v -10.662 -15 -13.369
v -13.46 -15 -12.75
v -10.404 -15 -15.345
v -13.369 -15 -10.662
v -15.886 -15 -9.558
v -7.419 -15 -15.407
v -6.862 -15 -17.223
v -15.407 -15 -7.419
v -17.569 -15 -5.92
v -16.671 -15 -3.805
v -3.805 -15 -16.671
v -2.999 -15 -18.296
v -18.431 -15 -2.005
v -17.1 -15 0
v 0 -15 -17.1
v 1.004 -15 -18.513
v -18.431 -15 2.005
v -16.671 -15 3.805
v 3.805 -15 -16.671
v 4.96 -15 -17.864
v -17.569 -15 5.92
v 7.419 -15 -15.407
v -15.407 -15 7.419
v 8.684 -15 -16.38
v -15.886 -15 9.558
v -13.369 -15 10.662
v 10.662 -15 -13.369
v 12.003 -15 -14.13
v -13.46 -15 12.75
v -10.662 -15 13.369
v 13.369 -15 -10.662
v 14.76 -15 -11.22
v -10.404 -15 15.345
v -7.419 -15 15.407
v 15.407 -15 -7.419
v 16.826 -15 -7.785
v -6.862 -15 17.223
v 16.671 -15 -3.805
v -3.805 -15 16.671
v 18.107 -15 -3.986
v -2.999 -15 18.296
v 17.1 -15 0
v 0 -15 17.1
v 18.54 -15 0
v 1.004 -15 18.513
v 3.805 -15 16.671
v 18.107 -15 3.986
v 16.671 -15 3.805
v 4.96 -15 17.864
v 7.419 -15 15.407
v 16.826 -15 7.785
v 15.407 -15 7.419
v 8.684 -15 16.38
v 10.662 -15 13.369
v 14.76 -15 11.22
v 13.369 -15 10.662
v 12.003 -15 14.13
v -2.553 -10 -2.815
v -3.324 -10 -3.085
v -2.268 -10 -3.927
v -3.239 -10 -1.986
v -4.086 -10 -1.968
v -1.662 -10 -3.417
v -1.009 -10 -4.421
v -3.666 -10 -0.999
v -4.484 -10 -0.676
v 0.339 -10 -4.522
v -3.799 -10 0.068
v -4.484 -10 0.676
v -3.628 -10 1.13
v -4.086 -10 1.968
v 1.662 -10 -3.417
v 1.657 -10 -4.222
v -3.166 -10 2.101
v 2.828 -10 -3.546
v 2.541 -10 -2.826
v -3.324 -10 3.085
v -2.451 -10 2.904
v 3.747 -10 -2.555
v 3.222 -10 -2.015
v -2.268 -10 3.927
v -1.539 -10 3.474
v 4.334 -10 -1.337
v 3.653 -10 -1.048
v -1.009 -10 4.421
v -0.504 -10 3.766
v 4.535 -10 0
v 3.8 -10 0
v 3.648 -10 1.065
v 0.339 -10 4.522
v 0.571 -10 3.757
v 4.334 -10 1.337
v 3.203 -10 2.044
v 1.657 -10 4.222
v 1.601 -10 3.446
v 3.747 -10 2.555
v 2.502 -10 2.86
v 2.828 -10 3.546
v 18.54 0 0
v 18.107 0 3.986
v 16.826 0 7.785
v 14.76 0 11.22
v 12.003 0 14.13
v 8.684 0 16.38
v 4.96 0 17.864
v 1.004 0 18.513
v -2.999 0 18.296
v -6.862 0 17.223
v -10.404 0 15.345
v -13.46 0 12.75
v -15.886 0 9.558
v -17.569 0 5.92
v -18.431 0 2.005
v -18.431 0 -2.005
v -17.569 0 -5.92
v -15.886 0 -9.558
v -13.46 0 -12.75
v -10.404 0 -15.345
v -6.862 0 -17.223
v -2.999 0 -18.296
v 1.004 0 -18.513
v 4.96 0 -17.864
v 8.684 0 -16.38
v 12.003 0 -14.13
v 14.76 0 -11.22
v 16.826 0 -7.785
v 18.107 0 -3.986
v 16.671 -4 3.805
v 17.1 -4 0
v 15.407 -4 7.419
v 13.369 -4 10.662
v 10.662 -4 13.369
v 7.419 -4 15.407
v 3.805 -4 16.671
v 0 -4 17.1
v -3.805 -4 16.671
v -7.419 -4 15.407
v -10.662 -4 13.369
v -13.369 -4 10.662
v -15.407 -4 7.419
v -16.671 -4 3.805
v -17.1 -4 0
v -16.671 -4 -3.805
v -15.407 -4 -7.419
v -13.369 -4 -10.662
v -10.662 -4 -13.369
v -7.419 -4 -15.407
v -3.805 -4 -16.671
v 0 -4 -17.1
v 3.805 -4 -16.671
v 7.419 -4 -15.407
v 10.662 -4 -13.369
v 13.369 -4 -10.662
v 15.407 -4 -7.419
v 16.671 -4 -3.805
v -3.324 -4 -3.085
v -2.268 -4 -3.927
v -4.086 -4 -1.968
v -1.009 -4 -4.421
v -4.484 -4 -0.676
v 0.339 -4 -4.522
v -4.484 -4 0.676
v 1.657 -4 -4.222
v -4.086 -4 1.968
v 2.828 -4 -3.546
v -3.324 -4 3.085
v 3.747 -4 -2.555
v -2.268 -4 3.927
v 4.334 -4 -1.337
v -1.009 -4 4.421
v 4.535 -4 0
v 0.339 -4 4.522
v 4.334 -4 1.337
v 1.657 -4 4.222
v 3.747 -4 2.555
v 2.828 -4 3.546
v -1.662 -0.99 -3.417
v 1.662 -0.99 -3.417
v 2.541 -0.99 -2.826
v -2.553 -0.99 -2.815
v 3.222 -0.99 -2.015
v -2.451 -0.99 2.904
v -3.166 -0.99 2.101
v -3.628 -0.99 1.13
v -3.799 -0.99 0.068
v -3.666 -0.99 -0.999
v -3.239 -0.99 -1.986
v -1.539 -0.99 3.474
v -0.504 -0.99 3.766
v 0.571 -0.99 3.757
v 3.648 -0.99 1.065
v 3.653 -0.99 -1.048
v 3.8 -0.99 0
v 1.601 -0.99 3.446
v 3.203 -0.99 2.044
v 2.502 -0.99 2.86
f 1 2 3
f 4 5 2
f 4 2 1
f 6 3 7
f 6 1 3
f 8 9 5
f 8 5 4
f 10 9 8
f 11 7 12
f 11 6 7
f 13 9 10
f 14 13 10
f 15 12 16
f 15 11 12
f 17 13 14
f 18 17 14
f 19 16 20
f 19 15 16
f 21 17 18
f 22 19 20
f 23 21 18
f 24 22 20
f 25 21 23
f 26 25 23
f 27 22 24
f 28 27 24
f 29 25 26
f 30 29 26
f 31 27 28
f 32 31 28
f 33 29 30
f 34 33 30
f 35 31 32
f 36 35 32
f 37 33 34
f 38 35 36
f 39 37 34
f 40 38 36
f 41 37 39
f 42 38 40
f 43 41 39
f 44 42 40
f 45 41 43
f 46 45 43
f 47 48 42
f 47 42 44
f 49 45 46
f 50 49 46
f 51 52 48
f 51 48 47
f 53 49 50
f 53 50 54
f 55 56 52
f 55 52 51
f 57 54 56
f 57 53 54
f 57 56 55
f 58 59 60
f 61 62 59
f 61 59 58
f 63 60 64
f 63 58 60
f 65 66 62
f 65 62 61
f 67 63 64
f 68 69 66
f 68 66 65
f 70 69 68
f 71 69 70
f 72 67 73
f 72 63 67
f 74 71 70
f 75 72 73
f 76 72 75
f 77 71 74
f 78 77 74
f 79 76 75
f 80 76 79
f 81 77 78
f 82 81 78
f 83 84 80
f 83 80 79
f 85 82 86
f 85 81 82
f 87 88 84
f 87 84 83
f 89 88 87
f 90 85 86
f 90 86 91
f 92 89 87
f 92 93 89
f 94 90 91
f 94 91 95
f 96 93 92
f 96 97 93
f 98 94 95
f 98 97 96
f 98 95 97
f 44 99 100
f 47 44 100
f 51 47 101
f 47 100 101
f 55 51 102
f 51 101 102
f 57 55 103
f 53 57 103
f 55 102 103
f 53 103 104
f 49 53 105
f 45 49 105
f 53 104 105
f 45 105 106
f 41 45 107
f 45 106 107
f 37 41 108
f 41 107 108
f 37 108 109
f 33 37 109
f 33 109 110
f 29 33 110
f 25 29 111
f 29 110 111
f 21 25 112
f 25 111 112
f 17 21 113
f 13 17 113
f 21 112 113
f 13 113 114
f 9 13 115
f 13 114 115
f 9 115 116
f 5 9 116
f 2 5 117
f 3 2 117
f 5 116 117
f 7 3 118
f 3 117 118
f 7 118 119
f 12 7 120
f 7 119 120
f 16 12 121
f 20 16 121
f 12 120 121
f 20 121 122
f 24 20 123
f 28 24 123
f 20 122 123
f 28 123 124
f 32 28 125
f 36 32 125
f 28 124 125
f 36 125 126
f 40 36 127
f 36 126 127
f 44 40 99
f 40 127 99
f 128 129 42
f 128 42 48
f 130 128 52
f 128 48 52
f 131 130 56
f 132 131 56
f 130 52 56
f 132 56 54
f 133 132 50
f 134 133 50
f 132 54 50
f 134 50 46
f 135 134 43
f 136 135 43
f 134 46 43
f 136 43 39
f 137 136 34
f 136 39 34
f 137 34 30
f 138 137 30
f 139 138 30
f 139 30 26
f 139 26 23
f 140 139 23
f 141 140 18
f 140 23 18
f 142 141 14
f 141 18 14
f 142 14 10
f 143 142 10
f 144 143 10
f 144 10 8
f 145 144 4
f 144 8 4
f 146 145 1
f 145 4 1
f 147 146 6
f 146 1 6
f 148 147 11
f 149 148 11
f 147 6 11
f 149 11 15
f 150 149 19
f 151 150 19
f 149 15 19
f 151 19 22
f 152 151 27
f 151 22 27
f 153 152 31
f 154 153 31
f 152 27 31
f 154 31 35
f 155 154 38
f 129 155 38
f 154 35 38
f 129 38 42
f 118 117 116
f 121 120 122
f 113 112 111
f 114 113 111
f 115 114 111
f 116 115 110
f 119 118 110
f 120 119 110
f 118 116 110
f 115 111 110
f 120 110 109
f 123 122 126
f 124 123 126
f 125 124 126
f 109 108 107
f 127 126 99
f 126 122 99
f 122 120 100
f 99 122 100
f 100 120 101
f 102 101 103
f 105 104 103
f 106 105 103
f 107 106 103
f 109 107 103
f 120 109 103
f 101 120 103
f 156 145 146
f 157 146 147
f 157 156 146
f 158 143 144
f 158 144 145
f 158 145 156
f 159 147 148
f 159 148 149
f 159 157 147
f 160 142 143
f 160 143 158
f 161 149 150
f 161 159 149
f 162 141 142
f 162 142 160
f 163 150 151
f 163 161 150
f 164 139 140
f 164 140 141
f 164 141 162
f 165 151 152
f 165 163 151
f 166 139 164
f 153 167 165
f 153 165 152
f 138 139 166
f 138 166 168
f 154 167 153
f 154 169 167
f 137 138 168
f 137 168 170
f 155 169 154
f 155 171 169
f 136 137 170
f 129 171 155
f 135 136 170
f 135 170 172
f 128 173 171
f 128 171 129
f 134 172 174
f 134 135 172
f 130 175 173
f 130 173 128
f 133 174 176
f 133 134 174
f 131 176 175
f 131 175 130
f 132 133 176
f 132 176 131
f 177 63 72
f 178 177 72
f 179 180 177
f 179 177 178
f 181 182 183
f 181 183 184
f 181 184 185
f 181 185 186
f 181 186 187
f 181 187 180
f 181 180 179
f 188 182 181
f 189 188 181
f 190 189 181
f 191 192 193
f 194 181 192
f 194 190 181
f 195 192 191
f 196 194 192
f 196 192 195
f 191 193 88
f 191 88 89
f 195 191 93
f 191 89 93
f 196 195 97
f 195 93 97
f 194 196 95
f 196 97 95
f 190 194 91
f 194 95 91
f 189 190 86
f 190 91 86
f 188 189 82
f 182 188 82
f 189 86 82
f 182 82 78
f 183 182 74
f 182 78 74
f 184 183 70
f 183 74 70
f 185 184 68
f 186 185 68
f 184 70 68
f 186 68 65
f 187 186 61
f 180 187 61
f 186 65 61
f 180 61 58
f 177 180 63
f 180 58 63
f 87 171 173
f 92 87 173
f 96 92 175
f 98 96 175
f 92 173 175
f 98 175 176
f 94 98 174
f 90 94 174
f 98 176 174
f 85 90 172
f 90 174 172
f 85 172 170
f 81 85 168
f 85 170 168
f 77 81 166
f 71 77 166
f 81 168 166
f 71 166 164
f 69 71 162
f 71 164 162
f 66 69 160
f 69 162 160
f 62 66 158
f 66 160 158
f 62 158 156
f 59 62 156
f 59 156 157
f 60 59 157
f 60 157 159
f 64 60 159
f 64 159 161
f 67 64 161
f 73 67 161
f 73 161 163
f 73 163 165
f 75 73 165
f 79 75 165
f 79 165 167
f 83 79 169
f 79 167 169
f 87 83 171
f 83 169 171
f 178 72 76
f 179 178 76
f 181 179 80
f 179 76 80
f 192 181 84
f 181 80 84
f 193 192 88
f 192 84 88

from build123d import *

# Parameters (mm, degrees)
F0_R     = 18.54
F1_DEPTH = 15
F2_R     = 17.1
F3_DEPTH = 11
F5_R     = 4.535
F6_DEPTH = 6
F9_DEPTH = 9.01


with BuildPart() as f1:
    # F0 (on Front) → F1 (new body)
    with BuildSketch(Plane.XZ):
        Circle(F0_R)
        with BuildLine():
            ThreePointArc((-2.5, -3.783679), (-2.148107, 3.993978), (4.535, 0))
            ThreePointArc((4.535, 0), (3.993978, -2.148107), (2.5, -3.783679))
            ThreePointArc((2.5, -3.783679), (0, -4.535), (-2.5, -3.783679))
        make_face(mode=Mode.SUBTRACT)
        with BuildLine():
            ThreePointArc((2.5, -3.783679), (3.993978, -2.148107), (4.535, 0))
            ThreePointArc((4.535, 0), (-2.148107, 3.993978), (-2.5, -3.783679))
            Line((-2.5, -3.783679), (2.5, -3.783679))
        make_face()
        with BuildLine():
            Line((2.5, -3.783679), (-2.5, -3.783679))
            ThreePointArc((-2.5, -3.783679), (0, -4.535), (2.5, -3.783679))
        make_face()
    extrude(amount=F1_DEPTH)

    # F2 (on face) → F3 (cut)
    with BuildSketch(Plane.XZ.offset(15)):
        Circle(F2_R)
    extrude(amount=-F3_DEPTH, mode=Mode.SUBTRACT)

    # F5 (on face) → F6 (join)
    with BuildSketch(Plane.XZ.offset(4)):
        Circle(F5_R)
    extrude(amount=F6_DEPTH)

    # F8 (on face) → F9 (cut)
    with BuildSketch(Plane.XZ.offset(10)):
        with BuildLine():
            ThreePointArc((1.662322, -3.417117), (3.221554, -2.015338), (3.8, 0))
            ThreePointArc((3.8, 0), (-2.015338, 3.221554), (-1.662322, -3.417117))
            Line((-1.662322, -3.417117), (1.662322, -3.417117))
        make_face()
    extrude(amount=-F9_DEPTH, mode=Mode.SUBTRACT)


solid = f1.part
